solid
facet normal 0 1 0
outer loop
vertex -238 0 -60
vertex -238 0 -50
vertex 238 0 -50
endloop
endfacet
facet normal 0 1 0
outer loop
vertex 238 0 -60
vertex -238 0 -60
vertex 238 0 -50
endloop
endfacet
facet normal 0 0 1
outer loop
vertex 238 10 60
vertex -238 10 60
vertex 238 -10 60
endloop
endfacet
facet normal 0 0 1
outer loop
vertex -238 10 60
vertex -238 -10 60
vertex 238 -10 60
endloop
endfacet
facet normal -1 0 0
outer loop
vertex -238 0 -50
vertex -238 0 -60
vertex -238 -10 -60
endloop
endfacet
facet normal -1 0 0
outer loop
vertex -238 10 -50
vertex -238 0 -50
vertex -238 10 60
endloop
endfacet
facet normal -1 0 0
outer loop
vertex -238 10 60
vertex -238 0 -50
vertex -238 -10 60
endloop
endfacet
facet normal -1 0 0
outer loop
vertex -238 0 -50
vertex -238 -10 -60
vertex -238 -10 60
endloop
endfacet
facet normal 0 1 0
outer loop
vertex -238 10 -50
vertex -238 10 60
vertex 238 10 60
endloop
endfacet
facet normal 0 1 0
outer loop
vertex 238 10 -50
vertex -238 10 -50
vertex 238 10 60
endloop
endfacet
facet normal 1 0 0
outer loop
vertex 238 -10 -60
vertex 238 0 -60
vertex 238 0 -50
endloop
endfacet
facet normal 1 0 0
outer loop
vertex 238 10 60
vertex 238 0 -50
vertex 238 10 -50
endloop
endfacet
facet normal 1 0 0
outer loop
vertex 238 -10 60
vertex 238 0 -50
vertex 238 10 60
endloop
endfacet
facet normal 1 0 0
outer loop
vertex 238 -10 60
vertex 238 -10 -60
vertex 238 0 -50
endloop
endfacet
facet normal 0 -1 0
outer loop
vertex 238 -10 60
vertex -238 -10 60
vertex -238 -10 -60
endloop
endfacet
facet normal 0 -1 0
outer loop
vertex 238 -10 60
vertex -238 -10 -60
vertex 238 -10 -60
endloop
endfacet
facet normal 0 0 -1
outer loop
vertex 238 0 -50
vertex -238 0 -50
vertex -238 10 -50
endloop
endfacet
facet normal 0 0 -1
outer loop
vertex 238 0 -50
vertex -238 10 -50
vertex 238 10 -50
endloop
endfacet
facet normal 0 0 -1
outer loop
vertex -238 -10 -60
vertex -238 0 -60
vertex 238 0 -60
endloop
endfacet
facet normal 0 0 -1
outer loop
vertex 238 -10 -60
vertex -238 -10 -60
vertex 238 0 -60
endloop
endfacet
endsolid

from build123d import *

# Parameters (mm, degrees)
F0_W     = 476
F0_H     = 10
F1_DEPTH = 10
F0_H_2   = 110
F2_DEPTH = 10


with BuildPart() as f1:
    # F0 (on Front) → F1 (new body)
    with BuildSketch(Plane.XZ):
        with Locations((0, -55)):
            Rectangle(F0_W, F0_H)
    extrude(amount=F1_DEPTH)

    # F0 (on Front) → F2 (join, symmetric)
    with BuildSketch(Plane.XZ):
        with Locations((0, 5)):
            Rectangle(F0_W, F0_H_2)
    extrude(amount=F2_DEPTH, both=True)


solid = f1.part
